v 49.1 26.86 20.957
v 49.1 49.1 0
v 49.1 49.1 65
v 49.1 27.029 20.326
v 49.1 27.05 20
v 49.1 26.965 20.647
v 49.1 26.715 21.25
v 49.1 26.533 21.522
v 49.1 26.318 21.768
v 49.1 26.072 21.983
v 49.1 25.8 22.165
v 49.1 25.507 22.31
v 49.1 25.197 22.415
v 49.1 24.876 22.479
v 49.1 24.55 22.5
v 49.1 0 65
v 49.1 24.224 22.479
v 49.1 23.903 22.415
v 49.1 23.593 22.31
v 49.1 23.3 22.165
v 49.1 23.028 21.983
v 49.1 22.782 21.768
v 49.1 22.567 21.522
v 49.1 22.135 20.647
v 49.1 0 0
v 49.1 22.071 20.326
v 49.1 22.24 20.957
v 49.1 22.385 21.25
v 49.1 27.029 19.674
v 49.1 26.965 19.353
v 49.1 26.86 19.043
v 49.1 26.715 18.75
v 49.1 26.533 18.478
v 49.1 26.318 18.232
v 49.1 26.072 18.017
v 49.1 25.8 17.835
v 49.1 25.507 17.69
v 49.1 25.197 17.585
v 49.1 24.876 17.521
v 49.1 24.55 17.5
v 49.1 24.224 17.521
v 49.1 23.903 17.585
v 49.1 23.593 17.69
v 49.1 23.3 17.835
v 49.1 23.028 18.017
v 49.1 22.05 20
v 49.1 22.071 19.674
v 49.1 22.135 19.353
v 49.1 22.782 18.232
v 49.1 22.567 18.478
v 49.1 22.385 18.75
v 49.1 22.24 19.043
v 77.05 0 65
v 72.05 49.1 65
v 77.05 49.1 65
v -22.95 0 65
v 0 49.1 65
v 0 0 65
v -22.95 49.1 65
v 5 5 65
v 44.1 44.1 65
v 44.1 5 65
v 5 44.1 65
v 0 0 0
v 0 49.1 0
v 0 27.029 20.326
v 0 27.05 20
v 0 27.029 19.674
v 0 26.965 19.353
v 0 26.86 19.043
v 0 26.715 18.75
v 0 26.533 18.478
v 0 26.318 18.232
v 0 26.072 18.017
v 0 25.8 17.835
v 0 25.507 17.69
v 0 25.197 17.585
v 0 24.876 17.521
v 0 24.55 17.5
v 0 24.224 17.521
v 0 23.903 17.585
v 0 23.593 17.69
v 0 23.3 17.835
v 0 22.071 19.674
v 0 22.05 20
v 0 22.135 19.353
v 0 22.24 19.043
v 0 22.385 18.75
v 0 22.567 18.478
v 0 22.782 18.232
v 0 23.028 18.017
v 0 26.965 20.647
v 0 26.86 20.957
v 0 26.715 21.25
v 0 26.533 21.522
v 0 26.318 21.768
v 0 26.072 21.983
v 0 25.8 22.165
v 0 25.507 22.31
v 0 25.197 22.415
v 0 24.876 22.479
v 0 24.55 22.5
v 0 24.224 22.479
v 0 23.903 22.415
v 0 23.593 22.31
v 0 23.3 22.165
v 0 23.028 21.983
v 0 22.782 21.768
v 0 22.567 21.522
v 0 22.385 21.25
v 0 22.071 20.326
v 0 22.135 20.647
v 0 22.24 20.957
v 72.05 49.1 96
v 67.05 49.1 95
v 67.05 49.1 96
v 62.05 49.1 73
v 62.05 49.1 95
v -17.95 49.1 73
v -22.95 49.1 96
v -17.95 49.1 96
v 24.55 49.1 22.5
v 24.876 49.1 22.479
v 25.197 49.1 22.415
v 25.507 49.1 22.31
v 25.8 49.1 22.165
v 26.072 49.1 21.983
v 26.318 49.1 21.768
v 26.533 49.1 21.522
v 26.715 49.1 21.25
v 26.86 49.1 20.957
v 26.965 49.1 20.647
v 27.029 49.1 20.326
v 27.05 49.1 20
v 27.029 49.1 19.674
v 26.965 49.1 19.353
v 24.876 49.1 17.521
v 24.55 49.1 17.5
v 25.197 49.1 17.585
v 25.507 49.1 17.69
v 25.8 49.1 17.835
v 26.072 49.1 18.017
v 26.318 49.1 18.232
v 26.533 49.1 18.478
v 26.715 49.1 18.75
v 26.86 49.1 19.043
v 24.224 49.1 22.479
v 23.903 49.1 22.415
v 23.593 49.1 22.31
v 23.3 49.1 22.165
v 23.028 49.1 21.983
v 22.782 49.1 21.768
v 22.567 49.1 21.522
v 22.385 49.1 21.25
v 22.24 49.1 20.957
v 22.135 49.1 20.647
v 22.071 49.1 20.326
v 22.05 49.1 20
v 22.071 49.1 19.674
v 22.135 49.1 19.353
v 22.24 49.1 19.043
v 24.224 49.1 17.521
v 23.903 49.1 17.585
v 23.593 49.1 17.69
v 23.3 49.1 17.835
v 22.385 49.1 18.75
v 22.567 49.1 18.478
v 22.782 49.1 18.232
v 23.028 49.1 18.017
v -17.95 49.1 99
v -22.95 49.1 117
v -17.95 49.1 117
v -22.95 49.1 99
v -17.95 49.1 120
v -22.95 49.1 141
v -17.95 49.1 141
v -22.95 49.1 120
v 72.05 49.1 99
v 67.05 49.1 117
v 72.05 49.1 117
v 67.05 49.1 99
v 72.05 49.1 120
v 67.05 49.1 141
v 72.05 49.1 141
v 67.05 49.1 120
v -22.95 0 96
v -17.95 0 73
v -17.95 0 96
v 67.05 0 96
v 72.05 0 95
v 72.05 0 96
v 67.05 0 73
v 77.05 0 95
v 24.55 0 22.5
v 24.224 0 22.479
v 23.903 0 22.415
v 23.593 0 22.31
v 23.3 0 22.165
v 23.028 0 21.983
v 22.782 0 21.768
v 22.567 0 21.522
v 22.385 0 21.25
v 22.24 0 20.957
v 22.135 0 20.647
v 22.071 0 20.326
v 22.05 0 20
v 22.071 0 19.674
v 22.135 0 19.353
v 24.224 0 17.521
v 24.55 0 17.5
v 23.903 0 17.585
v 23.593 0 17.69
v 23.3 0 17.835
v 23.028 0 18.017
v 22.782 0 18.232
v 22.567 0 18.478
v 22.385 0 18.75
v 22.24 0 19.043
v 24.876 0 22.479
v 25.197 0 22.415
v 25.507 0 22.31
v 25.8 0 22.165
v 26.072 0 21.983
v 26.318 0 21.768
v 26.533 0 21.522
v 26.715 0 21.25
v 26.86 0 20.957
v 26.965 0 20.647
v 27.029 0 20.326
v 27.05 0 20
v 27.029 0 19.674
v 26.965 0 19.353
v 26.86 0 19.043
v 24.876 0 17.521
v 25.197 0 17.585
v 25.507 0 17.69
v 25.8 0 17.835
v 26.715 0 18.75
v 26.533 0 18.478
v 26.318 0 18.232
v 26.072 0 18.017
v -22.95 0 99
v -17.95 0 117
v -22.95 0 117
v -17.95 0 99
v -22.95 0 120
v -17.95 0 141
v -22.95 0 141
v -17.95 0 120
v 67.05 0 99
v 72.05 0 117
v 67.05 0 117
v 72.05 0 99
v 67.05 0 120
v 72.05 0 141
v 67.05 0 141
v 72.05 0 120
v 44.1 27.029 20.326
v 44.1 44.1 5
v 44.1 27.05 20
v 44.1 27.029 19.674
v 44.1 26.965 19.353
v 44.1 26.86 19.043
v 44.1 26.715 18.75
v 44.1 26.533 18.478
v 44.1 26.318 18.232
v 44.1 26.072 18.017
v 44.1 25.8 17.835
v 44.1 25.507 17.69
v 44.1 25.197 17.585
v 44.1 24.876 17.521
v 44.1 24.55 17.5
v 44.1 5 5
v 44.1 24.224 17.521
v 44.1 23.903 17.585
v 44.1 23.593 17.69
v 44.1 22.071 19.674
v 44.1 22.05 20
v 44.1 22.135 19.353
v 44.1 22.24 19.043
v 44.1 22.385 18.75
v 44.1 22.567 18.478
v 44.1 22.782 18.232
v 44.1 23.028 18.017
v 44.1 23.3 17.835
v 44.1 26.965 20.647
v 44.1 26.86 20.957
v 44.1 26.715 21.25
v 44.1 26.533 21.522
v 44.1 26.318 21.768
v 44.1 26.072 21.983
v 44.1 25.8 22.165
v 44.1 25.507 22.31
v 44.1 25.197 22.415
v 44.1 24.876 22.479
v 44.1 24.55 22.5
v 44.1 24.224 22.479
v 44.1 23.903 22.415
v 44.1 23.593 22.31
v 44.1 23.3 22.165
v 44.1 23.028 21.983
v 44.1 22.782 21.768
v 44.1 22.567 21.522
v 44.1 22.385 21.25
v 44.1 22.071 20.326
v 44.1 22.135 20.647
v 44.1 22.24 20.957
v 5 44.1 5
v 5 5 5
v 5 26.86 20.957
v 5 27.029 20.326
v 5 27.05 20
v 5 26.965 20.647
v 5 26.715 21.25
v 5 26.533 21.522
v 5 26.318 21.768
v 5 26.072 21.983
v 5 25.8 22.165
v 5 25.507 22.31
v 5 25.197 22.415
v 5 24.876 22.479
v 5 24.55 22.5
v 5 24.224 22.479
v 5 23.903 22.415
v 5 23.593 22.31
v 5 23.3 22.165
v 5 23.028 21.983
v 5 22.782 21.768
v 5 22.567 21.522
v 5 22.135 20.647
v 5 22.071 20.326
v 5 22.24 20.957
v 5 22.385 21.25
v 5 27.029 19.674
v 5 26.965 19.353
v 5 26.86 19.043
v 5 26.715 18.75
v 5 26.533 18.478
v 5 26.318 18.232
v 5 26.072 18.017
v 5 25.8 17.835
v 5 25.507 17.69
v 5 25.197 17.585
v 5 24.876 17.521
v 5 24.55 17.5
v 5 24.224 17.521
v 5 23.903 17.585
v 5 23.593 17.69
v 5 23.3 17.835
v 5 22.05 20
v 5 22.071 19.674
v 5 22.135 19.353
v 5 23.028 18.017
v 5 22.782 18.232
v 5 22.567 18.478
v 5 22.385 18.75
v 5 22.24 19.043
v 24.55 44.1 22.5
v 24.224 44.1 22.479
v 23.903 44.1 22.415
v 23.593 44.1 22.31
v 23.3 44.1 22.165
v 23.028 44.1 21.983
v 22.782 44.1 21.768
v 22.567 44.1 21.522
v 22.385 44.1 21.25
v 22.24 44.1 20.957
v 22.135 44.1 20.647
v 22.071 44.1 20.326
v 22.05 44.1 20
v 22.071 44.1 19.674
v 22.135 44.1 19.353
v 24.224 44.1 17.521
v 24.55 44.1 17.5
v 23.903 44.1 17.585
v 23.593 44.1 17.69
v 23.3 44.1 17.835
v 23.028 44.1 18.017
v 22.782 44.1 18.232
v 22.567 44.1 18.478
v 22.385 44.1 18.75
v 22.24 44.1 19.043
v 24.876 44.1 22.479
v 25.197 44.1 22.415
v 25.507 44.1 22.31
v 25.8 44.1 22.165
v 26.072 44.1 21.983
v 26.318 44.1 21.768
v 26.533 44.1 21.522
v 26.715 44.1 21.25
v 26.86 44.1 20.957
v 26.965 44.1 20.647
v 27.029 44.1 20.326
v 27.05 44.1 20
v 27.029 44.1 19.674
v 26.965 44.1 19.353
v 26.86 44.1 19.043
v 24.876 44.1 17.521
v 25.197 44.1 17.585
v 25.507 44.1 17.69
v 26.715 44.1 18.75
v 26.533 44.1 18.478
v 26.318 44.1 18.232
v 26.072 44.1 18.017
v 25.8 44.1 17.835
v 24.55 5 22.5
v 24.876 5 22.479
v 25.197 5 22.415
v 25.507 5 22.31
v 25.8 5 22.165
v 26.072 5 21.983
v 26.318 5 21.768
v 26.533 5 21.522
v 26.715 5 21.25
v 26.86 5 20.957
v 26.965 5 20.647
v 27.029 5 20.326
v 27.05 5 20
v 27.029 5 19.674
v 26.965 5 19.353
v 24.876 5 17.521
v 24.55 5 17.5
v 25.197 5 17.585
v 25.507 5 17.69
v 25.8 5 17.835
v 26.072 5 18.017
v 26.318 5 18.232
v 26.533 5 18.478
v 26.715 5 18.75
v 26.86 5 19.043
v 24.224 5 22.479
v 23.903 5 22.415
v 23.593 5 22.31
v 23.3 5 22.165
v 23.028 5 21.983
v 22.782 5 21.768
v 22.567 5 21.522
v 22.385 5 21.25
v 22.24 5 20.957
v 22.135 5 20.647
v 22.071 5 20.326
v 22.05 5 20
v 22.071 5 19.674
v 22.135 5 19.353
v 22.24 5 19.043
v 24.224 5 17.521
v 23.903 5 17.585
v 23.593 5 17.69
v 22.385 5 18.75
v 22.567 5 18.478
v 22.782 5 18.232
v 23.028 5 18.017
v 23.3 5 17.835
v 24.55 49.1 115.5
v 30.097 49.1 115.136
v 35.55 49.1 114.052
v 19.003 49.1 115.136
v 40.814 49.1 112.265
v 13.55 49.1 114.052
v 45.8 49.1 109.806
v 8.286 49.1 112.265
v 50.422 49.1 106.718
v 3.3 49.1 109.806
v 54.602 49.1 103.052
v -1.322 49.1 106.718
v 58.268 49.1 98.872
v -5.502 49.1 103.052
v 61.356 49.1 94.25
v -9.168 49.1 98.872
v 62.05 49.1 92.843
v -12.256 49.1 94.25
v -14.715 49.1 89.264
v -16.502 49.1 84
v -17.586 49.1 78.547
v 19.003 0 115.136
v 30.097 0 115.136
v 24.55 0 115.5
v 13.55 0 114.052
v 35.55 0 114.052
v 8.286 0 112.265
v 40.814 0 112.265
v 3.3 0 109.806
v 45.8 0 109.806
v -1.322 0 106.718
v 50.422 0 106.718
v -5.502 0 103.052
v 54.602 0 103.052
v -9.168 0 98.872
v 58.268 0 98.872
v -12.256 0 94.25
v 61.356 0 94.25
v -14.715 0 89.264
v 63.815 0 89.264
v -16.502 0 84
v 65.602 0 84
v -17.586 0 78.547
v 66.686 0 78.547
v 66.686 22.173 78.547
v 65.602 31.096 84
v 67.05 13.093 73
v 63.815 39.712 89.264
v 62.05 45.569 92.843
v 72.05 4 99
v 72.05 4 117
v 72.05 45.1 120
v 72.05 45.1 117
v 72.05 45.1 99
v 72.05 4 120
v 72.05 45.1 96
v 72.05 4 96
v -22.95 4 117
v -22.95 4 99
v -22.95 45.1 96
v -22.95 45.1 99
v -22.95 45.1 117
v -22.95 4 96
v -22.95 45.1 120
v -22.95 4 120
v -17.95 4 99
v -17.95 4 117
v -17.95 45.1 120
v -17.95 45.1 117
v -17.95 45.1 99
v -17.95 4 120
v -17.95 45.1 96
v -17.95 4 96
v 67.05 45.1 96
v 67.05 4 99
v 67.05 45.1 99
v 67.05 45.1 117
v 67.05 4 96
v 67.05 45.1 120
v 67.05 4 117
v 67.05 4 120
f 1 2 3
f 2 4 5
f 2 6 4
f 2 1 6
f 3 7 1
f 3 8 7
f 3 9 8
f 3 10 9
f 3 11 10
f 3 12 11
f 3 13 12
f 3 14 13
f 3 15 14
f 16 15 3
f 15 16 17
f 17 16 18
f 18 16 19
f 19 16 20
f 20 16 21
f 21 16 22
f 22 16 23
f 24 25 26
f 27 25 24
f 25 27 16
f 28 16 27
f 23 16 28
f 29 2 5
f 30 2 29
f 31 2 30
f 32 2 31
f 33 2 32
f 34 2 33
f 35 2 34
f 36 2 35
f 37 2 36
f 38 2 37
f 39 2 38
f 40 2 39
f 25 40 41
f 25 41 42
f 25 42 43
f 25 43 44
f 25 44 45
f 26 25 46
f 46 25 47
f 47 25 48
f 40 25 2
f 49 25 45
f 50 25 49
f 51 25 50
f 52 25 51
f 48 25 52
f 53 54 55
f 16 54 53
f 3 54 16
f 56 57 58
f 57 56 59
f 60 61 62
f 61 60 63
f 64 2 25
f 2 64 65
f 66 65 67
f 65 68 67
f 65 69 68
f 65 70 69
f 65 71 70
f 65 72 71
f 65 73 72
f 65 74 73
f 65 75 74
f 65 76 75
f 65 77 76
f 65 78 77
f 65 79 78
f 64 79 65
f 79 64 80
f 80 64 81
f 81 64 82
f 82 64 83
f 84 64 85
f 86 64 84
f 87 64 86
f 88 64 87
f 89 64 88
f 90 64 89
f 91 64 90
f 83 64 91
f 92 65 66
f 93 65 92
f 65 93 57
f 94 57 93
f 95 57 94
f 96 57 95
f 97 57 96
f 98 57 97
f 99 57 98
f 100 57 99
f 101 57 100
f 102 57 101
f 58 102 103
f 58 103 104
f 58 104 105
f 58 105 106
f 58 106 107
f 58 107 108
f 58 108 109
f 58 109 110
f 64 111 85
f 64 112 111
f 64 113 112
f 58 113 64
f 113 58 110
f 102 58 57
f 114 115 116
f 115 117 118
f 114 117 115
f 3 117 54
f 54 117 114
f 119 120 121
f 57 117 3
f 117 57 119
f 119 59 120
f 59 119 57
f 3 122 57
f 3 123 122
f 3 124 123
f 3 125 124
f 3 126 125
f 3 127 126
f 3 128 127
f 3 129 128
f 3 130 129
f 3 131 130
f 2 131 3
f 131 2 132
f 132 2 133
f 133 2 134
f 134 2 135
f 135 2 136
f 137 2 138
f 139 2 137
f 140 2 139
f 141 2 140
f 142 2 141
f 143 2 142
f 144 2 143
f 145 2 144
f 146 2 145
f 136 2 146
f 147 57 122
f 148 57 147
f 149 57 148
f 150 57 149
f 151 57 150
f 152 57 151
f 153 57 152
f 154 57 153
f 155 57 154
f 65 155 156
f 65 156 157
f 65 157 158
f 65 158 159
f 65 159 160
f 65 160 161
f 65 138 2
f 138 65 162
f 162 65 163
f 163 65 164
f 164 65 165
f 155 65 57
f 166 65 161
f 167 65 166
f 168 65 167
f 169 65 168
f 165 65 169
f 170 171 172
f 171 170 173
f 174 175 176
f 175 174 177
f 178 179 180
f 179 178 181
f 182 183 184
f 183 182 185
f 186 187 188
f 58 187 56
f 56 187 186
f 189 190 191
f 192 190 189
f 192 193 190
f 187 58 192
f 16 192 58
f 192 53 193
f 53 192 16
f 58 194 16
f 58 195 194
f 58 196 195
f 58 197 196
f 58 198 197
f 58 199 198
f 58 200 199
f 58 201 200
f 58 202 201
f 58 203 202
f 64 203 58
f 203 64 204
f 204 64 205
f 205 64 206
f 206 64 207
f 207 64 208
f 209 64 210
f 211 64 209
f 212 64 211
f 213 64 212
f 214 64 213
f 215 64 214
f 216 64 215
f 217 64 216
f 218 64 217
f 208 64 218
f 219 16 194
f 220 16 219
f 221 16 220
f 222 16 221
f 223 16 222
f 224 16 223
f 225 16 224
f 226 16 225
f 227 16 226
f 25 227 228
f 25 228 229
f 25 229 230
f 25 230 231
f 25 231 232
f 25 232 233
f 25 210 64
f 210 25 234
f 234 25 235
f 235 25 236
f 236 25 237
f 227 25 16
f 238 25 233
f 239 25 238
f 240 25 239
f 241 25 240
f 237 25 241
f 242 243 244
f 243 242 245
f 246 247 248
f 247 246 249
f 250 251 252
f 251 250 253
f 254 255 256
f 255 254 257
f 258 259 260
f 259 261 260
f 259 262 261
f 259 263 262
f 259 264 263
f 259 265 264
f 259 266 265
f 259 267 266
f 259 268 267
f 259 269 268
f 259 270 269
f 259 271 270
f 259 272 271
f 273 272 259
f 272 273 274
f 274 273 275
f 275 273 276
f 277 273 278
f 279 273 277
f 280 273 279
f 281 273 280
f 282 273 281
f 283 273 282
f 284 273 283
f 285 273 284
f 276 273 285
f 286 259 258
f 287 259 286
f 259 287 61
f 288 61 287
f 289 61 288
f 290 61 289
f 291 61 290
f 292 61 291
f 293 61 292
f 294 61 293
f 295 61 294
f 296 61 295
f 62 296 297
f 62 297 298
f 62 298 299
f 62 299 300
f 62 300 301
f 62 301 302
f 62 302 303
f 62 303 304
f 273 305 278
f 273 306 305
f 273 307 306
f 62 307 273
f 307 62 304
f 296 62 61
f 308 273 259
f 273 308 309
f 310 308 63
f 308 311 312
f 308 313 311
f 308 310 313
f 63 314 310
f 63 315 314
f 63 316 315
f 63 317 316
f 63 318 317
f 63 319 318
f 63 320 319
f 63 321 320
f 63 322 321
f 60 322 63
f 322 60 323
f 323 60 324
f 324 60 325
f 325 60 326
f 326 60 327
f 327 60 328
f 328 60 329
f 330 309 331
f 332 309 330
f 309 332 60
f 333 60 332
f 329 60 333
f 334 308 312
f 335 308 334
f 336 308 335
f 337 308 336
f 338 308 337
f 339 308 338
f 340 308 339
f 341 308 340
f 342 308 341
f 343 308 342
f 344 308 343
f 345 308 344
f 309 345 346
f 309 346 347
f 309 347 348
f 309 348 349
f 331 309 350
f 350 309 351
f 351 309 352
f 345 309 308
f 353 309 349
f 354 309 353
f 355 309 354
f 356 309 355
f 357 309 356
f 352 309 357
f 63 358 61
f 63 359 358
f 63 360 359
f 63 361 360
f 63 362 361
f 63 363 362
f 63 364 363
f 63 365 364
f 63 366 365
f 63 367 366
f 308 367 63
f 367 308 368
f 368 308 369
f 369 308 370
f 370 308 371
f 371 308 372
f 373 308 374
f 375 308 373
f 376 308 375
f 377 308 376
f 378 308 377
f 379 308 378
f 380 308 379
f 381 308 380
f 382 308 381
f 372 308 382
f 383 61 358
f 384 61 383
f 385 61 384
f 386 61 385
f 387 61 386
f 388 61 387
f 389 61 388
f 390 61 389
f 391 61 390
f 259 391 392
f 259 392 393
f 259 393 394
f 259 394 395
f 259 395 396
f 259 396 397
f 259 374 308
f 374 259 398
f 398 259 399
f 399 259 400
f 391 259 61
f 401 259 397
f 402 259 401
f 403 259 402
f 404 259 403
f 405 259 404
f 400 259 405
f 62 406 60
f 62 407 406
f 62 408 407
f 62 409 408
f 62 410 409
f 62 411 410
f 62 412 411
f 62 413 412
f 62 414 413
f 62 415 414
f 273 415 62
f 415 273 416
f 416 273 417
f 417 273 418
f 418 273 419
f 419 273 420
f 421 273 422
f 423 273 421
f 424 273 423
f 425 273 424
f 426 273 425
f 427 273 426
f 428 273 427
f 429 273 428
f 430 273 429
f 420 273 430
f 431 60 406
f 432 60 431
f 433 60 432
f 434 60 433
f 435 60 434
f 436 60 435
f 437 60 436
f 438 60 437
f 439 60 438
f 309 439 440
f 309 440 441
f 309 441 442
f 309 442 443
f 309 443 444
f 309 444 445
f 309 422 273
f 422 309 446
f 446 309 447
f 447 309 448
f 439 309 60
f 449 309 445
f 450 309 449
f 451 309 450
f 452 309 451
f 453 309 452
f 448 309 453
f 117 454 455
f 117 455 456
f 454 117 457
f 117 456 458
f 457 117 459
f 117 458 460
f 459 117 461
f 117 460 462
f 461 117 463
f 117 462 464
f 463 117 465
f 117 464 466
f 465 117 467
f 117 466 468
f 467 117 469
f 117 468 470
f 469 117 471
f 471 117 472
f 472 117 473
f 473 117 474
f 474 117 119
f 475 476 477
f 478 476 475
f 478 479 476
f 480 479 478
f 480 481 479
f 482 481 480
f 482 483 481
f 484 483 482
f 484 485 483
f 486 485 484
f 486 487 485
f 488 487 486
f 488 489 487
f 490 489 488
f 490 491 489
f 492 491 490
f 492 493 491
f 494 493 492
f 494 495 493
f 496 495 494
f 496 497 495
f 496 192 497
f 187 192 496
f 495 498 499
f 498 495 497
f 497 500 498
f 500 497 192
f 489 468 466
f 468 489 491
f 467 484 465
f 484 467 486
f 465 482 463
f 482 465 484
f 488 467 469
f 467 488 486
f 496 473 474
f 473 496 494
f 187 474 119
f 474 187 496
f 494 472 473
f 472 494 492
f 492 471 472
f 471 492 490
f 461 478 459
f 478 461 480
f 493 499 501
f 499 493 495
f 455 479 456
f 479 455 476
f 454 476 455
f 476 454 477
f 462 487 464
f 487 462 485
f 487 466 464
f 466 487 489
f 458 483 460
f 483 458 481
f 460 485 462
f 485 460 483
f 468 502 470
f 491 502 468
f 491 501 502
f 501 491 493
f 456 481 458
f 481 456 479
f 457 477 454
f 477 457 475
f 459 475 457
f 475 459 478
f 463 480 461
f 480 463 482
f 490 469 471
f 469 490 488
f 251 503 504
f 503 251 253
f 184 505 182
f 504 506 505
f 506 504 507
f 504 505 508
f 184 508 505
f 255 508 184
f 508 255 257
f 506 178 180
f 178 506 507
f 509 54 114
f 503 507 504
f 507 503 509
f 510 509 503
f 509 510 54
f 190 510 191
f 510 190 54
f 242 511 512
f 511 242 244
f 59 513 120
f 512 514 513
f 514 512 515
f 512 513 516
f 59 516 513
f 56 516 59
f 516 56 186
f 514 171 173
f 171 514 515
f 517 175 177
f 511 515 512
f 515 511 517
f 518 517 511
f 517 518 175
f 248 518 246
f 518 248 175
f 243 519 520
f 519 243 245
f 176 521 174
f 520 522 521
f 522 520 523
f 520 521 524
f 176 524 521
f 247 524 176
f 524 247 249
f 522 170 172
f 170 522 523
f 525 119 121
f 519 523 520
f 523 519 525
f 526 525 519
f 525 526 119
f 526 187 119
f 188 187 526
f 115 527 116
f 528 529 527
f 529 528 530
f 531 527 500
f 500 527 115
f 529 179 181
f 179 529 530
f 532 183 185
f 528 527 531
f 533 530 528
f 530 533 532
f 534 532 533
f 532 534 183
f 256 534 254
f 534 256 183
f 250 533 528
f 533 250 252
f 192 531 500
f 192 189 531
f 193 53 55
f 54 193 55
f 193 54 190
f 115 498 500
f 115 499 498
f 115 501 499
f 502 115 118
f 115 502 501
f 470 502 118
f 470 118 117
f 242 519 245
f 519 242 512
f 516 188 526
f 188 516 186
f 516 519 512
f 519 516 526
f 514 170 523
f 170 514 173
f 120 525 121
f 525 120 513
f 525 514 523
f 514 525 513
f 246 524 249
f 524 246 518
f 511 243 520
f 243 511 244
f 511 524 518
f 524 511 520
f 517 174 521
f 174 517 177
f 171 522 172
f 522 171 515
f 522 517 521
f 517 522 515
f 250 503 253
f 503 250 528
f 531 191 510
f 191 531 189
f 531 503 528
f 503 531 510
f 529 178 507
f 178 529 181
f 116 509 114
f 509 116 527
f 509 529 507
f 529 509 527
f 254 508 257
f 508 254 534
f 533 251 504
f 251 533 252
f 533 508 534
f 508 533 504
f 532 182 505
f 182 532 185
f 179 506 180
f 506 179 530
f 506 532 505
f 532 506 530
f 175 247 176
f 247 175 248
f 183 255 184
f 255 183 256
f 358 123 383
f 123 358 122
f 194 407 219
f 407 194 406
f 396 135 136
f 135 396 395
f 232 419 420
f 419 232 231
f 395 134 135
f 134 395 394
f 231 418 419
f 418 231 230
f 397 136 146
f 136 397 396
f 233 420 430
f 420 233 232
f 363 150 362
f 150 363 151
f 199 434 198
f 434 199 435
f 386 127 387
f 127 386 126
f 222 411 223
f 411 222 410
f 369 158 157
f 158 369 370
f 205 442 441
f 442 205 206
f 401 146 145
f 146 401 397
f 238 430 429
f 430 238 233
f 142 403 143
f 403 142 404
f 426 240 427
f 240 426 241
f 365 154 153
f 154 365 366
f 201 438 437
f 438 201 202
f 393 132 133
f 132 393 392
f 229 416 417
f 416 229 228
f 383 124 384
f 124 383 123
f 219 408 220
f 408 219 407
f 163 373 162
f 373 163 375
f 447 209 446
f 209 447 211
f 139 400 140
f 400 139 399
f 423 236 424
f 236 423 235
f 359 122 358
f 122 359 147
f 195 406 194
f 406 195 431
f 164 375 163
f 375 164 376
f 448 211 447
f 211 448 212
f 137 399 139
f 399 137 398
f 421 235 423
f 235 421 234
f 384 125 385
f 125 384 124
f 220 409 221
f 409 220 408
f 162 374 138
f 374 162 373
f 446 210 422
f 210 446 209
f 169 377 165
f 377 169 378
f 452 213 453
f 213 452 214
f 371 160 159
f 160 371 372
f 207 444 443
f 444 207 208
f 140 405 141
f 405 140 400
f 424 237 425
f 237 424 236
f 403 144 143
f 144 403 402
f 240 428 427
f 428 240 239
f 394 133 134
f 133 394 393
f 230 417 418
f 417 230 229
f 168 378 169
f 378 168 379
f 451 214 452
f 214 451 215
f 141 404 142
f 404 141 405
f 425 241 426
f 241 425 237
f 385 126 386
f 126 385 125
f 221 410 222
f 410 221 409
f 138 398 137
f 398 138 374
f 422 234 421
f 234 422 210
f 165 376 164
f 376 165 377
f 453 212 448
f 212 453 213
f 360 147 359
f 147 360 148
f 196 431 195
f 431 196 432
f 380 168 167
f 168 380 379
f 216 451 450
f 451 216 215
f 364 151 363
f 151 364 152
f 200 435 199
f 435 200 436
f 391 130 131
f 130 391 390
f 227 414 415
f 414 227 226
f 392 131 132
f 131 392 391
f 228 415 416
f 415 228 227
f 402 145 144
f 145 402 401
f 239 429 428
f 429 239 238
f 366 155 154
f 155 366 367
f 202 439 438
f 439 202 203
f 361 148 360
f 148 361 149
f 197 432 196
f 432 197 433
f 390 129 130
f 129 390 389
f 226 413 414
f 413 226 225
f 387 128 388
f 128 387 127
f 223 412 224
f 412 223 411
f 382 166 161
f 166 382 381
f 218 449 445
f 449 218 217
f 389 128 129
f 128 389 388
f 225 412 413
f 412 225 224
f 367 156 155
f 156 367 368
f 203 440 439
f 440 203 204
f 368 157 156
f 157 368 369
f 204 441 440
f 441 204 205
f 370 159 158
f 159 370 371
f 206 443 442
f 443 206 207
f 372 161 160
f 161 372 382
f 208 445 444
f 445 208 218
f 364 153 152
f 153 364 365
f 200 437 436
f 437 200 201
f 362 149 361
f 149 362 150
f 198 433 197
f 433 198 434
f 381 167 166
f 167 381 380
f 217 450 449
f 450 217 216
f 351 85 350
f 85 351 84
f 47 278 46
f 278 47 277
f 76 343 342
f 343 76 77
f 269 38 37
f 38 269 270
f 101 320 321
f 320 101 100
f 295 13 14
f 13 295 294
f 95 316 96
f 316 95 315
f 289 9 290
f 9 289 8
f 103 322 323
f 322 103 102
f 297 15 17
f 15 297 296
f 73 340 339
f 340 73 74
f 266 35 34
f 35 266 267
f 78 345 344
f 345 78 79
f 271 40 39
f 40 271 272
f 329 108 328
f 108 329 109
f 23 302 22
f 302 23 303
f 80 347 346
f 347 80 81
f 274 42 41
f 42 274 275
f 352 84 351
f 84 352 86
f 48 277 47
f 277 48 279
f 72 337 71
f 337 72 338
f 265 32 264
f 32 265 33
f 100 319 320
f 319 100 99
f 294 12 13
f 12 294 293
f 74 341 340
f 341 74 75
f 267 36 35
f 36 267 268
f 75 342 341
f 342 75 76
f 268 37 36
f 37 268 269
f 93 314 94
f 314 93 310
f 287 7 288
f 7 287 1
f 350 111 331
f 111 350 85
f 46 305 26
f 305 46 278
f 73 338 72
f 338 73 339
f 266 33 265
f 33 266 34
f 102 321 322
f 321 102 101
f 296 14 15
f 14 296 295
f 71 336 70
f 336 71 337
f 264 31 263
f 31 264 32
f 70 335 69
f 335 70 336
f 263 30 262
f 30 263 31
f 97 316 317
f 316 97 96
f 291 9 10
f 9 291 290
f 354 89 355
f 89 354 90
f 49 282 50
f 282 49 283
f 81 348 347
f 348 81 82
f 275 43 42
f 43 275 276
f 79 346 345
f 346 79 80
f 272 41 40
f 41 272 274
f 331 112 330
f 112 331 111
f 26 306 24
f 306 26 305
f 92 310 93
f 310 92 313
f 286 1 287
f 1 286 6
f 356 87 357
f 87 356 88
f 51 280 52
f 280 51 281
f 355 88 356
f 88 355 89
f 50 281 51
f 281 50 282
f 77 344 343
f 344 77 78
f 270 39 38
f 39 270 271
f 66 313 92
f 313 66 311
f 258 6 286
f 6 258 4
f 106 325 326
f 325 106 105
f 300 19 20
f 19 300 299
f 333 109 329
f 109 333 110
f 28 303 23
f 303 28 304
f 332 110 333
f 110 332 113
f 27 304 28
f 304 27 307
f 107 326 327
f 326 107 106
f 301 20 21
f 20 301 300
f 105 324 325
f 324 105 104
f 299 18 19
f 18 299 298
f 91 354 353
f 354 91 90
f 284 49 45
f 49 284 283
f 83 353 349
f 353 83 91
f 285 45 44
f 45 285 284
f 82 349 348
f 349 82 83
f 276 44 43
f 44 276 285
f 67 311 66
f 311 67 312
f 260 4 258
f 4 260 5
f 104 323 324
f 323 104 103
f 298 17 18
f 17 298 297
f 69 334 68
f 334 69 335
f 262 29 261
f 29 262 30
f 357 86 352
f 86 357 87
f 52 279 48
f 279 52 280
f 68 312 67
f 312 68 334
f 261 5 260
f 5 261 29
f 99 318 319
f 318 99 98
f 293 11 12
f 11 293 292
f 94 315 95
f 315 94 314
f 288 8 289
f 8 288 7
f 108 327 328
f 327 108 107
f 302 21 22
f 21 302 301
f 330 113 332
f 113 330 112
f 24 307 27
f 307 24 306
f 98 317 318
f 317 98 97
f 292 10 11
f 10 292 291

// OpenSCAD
// Tree Branch Crutch - 3D Printable
// Fits 2x2 lumber (actual 38.1mm), holds branches up to 3" (76mm)
// Generated by Chronicle

$fn = 48;

socket_inner = 39.1;
socket_outer = 49.1;
socket_depth = 65.0;
wall = 5.0;

cradle_w = 85.0;
cradle_h = 70.0;
cradle_wall = 5.0;
cradle_floor = 8.0;

total_w = cradle_w + 2 * cradle_wall;

notch_w = 3.0;
notch_d = 4.0;

screw_dia = 5.0;
screw_z = 20.0;

gusset_h = 30.0;

difference() {
    union() {
        // Socket - hollow square tube
        difference() {
            cube([socket_outer, socket_outer, socket_depth], center=false);
            translate([wall, wall, wall])
                cube([socket_inner, socket_inner, socket_depth], center=false);
        }

        // Cradle base plate
        translate([socket_outer/2 - total_w/2, 0, socket_depth])
            cube([total_w, socket_outer, cradle_floor], center=false);

        // Left cradle arm
        translate([socket_outer/2 - total_w/2, 0, socket_depth + cradle_floor])
            cube([cradle_wall, socket_outer, cradle_h], center=false);

        // Right cradle arm
        translate([socket_outer/2 + cradle_w/2, 0, socket_depth + cradle_floor])
            cube([cradle_wall, socket_outer, cradle_h], center=false);

        // Gussets (triangular supports from socket to cradle arms)
        // Left front gusset
        translate([socket_outer/2 - total_w/2, 0, socket_depth])
            rotate([90, 0, 90])
                linear_extrude(cradle_wall)
                    polygon([[0,0], [0, gusset_h], [socket_outer, 0]]);

        // Left back gusset
        translate([socket_outer/2 - total_w/2 + cradle_wall, socket_outer, socket_depth])
            rotate([90, 0, -90])
                linear_extrude(cradle_wall)
                    polygon([[0,0], [0, gusset_h], [socket_outer, 0]]);

        // Right front gusset
        translate([socket_outer/2 + cradle_w/2 + cradle_wall, 0, socket_depth])
            rotate([90, 0, 90])
                linear_extrude(cradle_wall)
                    polygon([[0,0], [0, gusset_h], [socket_outer, 0]]);

        // Right back gusset
        translate([socket_outer/2 + cradle_w/2, socket_outer, socket_depth])
            rotate([90, 0, -90])
                linear_extrude(cradle_wall)
                    polygon([[0,0], [0, gusset_h], [socket_outer, 0]]);

        // Inner cradle curve - rounded floor for branch comfort
        translate([socket_outer/2, socket_outer/2, socket_depth + cradle_floor])
            rotate([0, 0, 0])
                intersection() {
                    translate([-cradle_w/2, -socket_outer/2, 0])
                        cube([cradle_w, socket_outer, cradle_w/2]);
                    rotate([90, 0, 0])
                        cylinder(h=socket_outer, r=cradle_w/2, center=true);
                }
    }

    // Rope notches - V grooves on outside of each arm
    // Left arm notches
    for (frac = [0.35, 0.65]) {
        nz = socket_depth + cradle_floor + frac * cradle_h;

        // Front notch
        translate([socket_outer/2 - total_w/2 - 1, -1, nz - notch_w/2])
            cube([cradle_wall + 2, notch_d + 1, notch_w]);

        // Back notch
        translate([socket_outer/2 - total_w/2 - 1, socket_outer - notch_d, nz - notch_w/2])
            cube([cradle_wall + 2, notch_d + 1, notch_w]);
    }

    // Right arm notches
    for (frac = [0.35, 0.65]) {
        nz = socket_depth + cradle_floor + frac * cradle_h;

        translate([socket_outer/2 + cradle_w/2 - 1, -1, nz - notch_w/2])
            cube([cradle_wall + 2, notch_d + 1, notch_w]);

        translate([socket_outer/2 + cradle_w/2 - 1, socket_outer - notch_d, nz - notch_w/2])
            cube([cradle_wall + 2, notch_d + 1, notch_w]);
    }

    // Screw holes through socket walls (two axes)
    // Front-to-back
    translate([socket_outer/2, -1, screw_z])
        rotate([-90, 0, 0])
            cylinder(h=socket_outer + 2, d=screw_dia);

    // Left-to-right
    translate([-1, socket_outer/2, screw_z])
        rotate([0, 90, 0])
            cylinder(h=socket_outer + 2, d=screw_dia);

    // Top chamfer on cradle arms for comfort
    for (x = [socket_outer/2 - total_w/2, socket_outer/2 + cradle_w/2]) {
        translate([x, -1, socket_depth + cradle_floor + cradle_h - 2])
            rotate([0, 0, 0])
                translate([0, 0, 0])
                    cube([cradle_wall, socket_outer + 2, 3]);
    }
    // Replace with chamfered tops
}

// Re-add chamfered arm tops
module arm_top(x_pos) {
    translate([x_pos, 0, socket_depth + cradle_floor + cradle_h - 3])
        hull() {
            cube([cradle_wall, socket_outer, 0.01]);
            translate([cradle_wall * 0.15, 0, 3])
                cube([cradle_wall * 0.7, socket_outer, 0.01]);
        }
}

// Note: the chamfer in the difference above trims the tops.
// For a cleaner chamfer, use a slicer chamfer setting.
